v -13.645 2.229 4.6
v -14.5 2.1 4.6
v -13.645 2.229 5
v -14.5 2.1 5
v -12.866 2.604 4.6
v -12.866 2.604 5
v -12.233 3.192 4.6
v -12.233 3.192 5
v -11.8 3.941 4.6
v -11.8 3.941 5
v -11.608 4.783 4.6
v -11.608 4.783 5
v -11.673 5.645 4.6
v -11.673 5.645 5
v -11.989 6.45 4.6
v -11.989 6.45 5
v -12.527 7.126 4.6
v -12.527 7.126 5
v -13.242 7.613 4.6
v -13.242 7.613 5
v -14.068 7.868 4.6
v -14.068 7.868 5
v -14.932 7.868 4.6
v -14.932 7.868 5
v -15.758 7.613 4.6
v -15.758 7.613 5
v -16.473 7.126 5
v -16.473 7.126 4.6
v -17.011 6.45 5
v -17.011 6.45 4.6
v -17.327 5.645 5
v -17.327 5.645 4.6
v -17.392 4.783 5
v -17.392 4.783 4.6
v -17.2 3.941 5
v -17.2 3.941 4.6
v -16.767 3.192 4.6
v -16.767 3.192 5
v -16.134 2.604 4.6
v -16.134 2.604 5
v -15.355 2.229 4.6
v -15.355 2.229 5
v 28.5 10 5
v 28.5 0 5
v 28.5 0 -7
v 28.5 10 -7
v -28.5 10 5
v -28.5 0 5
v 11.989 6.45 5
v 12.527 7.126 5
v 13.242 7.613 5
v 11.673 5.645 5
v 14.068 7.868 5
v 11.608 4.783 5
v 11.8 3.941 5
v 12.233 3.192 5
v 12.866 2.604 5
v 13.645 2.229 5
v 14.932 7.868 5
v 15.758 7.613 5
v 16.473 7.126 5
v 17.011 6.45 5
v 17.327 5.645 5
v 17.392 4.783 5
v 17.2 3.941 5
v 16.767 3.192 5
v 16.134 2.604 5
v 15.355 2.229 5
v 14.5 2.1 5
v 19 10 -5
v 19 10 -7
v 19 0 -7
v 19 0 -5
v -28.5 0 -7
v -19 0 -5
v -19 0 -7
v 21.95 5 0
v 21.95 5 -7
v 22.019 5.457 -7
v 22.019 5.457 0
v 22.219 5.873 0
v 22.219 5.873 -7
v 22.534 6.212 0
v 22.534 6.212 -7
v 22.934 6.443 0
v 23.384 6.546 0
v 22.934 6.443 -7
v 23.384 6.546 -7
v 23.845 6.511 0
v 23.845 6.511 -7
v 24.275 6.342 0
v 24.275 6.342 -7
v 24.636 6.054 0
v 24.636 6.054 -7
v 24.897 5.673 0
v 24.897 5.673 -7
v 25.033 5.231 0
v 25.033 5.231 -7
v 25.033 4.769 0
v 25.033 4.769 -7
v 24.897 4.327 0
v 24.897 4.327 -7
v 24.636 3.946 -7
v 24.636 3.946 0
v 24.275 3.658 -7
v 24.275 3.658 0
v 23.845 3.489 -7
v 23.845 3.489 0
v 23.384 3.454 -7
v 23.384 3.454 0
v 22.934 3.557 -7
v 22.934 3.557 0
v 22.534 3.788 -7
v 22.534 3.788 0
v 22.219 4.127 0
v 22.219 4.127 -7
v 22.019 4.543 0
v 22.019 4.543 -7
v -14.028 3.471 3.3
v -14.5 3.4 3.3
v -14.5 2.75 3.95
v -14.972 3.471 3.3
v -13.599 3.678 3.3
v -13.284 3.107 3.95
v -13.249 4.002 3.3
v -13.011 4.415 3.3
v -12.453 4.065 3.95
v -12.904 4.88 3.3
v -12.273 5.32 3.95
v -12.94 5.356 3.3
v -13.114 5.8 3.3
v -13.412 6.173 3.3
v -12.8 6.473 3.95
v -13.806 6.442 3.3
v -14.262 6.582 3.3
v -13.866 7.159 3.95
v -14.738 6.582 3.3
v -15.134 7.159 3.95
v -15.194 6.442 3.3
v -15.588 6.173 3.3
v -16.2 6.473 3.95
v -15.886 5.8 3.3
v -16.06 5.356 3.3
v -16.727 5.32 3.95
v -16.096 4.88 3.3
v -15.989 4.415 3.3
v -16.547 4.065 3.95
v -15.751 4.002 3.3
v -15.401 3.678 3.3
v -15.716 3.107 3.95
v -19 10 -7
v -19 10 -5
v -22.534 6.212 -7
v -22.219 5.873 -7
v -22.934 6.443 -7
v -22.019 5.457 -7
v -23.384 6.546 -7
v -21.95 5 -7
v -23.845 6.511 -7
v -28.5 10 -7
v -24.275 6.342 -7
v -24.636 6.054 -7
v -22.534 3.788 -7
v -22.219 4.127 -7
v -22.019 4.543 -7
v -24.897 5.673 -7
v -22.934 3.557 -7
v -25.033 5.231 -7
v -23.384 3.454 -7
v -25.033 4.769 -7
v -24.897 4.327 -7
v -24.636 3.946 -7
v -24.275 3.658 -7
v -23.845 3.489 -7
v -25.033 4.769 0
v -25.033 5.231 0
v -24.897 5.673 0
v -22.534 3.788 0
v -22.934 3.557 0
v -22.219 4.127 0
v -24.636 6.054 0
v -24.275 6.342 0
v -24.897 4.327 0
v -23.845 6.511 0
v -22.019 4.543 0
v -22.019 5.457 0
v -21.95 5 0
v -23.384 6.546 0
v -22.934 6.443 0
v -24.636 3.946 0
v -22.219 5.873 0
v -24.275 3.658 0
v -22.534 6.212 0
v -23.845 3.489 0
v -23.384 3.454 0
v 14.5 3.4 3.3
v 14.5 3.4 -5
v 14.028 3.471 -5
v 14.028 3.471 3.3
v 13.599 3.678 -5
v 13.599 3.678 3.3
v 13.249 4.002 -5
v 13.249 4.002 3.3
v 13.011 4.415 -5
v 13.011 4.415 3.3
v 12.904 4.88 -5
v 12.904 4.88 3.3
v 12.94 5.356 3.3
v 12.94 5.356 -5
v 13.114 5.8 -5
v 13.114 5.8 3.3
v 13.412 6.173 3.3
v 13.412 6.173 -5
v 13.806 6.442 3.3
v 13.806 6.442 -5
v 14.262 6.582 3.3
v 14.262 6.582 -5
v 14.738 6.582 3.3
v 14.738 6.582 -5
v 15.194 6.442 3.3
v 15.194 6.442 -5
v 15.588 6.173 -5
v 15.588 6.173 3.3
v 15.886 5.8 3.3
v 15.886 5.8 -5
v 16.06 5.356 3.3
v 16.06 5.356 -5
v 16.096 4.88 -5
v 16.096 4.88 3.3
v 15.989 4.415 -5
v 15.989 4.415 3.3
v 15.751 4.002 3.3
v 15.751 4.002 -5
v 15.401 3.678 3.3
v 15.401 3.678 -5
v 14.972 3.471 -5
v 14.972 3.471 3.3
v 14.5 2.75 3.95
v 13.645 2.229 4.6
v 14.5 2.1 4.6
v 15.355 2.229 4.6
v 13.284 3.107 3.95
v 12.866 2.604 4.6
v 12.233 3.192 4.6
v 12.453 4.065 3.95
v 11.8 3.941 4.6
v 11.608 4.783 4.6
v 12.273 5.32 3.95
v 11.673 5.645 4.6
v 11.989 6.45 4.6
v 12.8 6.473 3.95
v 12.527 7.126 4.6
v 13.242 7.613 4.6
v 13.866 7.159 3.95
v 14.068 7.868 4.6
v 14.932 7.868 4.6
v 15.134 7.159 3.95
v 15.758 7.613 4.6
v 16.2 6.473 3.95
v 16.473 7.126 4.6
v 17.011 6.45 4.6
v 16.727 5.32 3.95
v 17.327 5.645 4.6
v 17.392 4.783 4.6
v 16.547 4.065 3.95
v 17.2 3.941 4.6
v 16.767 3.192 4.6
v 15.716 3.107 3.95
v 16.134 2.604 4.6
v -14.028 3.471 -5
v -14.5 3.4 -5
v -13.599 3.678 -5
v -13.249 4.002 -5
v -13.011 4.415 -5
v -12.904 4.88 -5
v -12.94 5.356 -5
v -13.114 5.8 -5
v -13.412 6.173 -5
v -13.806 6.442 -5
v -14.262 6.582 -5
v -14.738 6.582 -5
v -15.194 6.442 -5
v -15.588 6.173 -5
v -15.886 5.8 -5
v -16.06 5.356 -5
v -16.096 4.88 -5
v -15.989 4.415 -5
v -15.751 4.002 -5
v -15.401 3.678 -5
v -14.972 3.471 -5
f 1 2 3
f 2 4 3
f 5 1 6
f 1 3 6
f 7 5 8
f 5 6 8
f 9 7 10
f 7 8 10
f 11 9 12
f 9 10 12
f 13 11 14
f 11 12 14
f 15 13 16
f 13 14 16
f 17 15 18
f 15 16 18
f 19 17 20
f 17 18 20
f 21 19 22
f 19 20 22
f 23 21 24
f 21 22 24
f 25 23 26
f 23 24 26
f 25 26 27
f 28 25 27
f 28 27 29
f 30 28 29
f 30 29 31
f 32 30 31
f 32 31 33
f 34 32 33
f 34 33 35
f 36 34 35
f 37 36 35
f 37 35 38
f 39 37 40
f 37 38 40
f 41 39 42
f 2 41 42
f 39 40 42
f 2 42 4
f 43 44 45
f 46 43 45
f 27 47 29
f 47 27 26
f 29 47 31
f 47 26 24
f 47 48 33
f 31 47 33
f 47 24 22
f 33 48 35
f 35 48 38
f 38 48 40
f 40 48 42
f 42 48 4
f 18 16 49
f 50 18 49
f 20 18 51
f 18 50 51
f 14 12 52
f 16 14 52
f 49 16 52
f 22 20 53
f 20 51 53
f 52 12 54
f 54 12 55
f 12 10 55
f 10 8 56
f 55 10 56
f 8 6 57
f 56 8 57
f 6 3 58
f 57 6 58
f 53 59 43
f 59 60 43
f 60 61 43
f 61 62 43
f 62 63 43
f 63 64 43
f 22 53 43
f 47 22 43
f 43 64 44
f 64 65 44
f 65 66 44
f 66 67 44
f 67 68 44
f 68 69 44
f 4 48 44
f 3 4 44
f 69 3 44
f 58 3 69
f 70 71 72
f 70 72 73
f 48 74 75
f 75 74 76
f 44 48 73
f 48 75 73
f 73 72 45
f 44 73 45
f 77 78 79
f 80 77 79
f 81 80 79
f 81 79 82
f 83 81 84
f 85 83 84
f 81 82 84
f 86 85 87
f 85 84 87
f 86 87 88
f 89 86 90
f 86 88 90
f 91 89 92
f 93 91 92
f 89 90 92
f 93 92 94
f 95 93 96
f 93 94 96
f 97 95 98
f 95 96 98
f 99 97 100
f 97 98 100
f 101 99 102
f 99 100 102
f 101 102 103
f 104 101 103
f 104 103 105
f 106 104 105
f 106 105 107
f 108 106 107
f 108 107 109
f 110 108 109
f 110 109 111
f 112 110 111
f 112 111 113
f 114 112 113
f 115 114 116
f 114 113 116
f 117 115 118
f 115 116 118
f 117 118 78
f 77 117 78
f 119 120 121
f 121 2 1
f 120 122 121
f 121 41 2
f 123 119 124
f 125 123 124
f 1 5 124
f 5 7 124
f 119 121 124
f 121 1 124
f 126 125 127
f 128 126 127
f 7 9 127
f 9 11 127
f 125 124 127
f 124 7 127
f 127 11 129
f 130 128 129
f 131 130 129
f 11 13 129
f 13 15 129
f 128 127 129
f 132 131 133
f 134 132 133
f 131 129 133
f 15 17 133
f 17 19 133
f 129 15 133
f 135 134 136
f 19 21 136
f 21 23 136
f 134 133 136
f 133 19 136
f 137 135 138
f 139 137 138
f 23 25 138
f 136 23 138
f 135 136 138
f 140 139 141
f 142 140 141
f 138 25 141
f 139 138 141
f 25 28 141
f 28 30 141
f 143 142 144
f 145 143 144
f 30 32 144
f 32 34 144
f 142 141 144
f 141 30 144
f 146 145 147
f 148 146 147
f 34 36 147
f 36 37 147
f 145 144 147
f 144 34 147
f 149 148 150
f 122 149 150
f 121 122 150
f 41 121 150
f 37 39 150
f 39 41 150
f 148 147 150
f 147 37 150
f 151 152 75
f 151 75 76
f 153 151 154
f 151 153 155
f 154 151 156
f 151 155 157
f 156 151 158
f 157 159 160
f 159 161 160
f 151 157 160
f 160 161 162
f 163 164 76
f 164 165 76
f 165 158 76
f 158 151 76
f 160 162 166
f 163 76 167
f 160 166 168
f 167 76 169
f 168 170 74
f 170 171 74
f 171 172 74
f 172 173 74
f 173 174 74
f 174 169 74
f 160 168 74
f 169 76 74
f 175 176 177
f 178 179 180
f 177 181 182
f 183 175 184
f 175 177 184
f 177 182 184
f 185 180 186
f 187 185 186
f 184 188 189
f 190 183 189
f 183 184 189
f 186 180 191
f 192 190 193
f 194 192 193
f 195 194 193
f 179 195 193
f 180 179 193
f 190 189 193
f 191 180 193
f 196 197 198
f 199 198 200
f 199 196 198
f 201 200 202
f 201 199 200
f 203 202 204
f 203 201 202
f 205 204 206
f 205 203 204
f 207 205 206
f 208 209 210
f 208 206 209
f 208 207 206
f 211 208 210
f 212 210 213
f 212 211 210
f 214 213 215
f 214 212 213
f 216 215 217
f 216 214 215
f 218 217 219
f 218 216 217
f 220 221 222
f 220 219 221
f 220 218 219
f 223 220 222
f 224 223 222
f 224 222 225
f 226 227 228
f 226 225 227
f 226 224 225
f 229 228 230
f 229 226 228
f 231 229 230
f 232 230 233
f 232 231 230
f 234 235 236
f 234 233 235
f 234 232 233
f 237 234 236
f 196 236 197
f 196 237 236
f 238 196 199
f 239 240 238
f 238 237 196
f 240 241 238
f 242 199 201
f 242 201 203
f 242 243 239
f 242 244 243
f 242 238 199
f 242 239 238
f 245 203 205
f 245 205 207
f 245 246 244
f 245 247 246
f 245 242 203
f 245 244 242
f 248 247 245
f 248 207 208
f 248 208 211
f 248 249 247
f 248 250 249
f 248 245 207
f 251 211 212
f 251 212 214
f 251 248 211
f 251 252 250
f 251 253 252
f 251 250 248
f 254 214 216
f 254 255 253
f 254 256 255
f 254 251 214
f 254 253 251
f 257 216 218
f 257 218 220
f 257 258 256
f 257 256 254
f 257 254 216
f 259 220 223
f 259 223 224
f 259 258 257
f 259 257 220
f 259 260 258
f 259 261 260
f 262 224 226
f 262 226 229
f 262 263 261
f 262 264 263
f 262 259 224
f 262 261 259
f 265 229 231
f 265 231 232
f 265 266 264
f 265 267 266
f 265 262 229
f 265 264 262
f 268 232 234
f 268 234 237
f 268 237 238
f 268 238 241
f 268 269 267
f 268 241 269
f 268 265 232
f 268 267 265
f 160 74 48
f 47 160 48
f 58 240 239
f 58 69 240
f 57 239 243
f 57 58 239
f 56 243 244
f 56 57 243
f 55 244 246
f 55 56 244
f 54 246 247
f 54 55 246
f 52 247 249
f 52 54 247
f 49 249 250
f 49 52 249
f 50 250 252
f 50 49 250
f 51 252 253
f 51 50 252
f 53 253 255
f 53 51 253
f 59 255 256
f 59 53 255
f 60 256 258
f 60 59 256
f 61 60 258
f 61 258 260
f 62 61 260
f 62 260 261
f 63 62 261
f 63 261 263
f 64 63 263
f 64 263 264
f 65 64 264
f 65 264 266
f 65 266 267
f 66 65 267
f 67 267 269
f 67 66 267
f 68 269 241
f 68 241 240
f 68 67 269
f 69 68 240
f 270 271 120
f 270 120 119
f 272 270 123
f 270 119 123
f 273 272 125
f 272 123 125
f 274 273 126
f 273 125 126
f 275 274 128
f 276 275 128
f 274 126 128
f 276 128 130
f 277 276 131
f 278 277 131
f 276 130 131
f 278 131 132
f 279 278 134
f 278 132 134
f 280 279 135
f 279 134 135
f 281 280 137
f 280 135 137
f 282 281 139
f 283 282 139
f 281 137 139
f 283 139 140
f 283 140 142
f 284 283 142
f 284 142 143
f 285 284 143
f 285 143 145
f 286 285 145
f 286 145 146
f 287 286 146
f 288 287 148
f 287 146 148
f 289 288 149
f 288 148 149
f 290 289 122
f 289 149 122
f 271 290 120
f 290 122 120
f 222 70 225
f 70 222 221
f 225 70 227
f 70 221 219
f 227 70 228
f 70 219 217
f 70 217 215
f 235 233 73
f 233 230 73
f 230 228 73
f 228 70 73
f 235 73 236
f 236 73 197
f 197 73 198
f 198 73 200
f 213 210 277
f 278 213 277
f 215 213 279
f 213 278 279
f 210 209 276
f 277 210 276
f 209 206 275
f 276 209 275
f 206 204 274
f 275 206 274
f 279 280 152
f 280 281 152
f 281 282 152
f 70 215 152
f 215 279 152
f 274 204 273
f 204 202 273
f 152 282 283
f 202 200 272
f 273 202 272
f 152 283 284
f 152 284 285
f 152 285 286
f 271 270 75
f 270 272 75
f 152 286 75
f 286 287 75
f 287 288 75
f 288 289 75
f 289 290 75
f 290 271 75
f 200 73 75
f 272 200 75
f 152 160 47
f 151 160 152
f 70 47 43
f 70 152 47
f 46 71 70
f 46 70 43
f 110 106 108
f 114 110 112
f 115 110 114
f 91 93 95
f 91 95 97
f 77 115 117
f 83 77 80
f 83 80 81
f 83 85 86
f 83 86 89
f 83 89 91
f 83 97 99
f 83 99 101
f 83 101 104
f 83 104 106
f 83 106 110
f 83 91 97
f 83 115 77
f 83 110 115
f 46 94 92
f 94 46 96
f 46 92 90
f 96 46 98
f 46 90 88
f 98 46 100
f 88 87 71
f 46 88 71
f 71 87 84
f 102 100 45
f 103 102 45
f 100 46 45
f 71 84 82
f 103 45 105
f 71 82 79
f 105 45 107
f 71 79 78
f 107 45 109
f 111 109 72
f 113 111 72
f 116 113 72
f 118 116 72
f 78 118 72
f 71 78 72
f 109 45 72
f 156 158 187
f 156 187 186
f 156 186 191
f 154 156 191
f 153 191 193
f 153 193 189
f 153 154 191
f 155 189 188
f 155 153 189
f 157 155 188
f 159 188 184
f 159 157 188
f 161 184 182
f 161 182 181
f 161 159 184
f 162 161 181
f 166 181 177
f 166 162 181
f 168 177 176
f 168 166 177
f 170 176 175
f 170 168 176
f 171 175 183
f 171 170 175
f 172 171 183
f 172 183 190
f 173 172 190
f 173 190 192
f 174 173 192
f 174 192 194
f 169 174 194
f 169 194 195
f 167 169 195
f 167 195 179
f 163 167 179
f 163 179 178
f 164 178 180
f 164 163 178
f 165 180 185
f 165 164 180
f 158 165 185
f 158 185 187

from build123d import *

# Parameters (mm, degrees)
BOSS_EXTRU_1_DEPTH      = 10
ESQUISSE2_R             = 1.55
ENL_V_MAT_EXTRU_1_DEPTH = 7


with BuildPart() as part:
    # Esquisse1 → Boss.-Extru.1 (new body)
    with BuildSketch(Plane(origin=(0, 0, 0), x_dir=(1, 0, 0), z_dir=(0, 1, 0))):
        Polygon((-28.5, -5), (28.5, -5), (28.5, 7), (19, 7), (19, 5), (-19, 5), (-19, 7), (-28.5, 7), align=None)
    extrude(amount=BOSS_EXTRU_1_DEPTH)

    # Esquisse2 → Enlèv. mat.-Extru.1 (cut)
    with BuildSketch(Plane(origin=(0, 0, -7), x_dir=(-1, 0, 0), z_dir=(0, 0, -1))):
        with Locations((-23.5, 5)):
            Circle(ESQUISSE2_R)
    enl_v_mat_extru_1 = extrude(amount=-ENL_V_MAT_EXTRU_1_DEPTH, mode=Mode.SUBTRACT)

    # Esquisse4 → Fraisage pour vis à tête fraisée à 6 pans creux M31 (revolve, cut)
    with BuildSketch(Plane(origin=(14.5, 5, 5), x_dir=(0, -1, 0), z_dir=(1, 0, 0))):
        Polygon((0, 0), (0, 12), (1.6, 12), (1.6, 1.7), (2.9, 0.4), (2.9, 0), align=None)
    fraisage_pour_vis_t_te_frais_e_6_pan = revolve(axis=Axis((14.5, 5, 11.35), (0, 0, -1)), mode=Mode.SUBTRACT)

    # Symétrie1: Enlèv. mat.-Extru.1, Fraisage pour vis à tête fraisée à 6 pans creux M31 across plane
    add(enl_v_mat_extru_1.mirror(Plane(origin=(0, 0, 0), x_dir=(0, 0, 1), z_dir=(1, 0, 0))), mode=Mode.SUBTRACT)
    add(fraisage_pour_vis_t_te_frais_e_6_pan.mirror(Plane(origin=(0, 0, 0), x_dir=(0, 0, 1), z_dir=(1, 0, 0))), mode=Mode.SUBTRACT)


solid = part.part
